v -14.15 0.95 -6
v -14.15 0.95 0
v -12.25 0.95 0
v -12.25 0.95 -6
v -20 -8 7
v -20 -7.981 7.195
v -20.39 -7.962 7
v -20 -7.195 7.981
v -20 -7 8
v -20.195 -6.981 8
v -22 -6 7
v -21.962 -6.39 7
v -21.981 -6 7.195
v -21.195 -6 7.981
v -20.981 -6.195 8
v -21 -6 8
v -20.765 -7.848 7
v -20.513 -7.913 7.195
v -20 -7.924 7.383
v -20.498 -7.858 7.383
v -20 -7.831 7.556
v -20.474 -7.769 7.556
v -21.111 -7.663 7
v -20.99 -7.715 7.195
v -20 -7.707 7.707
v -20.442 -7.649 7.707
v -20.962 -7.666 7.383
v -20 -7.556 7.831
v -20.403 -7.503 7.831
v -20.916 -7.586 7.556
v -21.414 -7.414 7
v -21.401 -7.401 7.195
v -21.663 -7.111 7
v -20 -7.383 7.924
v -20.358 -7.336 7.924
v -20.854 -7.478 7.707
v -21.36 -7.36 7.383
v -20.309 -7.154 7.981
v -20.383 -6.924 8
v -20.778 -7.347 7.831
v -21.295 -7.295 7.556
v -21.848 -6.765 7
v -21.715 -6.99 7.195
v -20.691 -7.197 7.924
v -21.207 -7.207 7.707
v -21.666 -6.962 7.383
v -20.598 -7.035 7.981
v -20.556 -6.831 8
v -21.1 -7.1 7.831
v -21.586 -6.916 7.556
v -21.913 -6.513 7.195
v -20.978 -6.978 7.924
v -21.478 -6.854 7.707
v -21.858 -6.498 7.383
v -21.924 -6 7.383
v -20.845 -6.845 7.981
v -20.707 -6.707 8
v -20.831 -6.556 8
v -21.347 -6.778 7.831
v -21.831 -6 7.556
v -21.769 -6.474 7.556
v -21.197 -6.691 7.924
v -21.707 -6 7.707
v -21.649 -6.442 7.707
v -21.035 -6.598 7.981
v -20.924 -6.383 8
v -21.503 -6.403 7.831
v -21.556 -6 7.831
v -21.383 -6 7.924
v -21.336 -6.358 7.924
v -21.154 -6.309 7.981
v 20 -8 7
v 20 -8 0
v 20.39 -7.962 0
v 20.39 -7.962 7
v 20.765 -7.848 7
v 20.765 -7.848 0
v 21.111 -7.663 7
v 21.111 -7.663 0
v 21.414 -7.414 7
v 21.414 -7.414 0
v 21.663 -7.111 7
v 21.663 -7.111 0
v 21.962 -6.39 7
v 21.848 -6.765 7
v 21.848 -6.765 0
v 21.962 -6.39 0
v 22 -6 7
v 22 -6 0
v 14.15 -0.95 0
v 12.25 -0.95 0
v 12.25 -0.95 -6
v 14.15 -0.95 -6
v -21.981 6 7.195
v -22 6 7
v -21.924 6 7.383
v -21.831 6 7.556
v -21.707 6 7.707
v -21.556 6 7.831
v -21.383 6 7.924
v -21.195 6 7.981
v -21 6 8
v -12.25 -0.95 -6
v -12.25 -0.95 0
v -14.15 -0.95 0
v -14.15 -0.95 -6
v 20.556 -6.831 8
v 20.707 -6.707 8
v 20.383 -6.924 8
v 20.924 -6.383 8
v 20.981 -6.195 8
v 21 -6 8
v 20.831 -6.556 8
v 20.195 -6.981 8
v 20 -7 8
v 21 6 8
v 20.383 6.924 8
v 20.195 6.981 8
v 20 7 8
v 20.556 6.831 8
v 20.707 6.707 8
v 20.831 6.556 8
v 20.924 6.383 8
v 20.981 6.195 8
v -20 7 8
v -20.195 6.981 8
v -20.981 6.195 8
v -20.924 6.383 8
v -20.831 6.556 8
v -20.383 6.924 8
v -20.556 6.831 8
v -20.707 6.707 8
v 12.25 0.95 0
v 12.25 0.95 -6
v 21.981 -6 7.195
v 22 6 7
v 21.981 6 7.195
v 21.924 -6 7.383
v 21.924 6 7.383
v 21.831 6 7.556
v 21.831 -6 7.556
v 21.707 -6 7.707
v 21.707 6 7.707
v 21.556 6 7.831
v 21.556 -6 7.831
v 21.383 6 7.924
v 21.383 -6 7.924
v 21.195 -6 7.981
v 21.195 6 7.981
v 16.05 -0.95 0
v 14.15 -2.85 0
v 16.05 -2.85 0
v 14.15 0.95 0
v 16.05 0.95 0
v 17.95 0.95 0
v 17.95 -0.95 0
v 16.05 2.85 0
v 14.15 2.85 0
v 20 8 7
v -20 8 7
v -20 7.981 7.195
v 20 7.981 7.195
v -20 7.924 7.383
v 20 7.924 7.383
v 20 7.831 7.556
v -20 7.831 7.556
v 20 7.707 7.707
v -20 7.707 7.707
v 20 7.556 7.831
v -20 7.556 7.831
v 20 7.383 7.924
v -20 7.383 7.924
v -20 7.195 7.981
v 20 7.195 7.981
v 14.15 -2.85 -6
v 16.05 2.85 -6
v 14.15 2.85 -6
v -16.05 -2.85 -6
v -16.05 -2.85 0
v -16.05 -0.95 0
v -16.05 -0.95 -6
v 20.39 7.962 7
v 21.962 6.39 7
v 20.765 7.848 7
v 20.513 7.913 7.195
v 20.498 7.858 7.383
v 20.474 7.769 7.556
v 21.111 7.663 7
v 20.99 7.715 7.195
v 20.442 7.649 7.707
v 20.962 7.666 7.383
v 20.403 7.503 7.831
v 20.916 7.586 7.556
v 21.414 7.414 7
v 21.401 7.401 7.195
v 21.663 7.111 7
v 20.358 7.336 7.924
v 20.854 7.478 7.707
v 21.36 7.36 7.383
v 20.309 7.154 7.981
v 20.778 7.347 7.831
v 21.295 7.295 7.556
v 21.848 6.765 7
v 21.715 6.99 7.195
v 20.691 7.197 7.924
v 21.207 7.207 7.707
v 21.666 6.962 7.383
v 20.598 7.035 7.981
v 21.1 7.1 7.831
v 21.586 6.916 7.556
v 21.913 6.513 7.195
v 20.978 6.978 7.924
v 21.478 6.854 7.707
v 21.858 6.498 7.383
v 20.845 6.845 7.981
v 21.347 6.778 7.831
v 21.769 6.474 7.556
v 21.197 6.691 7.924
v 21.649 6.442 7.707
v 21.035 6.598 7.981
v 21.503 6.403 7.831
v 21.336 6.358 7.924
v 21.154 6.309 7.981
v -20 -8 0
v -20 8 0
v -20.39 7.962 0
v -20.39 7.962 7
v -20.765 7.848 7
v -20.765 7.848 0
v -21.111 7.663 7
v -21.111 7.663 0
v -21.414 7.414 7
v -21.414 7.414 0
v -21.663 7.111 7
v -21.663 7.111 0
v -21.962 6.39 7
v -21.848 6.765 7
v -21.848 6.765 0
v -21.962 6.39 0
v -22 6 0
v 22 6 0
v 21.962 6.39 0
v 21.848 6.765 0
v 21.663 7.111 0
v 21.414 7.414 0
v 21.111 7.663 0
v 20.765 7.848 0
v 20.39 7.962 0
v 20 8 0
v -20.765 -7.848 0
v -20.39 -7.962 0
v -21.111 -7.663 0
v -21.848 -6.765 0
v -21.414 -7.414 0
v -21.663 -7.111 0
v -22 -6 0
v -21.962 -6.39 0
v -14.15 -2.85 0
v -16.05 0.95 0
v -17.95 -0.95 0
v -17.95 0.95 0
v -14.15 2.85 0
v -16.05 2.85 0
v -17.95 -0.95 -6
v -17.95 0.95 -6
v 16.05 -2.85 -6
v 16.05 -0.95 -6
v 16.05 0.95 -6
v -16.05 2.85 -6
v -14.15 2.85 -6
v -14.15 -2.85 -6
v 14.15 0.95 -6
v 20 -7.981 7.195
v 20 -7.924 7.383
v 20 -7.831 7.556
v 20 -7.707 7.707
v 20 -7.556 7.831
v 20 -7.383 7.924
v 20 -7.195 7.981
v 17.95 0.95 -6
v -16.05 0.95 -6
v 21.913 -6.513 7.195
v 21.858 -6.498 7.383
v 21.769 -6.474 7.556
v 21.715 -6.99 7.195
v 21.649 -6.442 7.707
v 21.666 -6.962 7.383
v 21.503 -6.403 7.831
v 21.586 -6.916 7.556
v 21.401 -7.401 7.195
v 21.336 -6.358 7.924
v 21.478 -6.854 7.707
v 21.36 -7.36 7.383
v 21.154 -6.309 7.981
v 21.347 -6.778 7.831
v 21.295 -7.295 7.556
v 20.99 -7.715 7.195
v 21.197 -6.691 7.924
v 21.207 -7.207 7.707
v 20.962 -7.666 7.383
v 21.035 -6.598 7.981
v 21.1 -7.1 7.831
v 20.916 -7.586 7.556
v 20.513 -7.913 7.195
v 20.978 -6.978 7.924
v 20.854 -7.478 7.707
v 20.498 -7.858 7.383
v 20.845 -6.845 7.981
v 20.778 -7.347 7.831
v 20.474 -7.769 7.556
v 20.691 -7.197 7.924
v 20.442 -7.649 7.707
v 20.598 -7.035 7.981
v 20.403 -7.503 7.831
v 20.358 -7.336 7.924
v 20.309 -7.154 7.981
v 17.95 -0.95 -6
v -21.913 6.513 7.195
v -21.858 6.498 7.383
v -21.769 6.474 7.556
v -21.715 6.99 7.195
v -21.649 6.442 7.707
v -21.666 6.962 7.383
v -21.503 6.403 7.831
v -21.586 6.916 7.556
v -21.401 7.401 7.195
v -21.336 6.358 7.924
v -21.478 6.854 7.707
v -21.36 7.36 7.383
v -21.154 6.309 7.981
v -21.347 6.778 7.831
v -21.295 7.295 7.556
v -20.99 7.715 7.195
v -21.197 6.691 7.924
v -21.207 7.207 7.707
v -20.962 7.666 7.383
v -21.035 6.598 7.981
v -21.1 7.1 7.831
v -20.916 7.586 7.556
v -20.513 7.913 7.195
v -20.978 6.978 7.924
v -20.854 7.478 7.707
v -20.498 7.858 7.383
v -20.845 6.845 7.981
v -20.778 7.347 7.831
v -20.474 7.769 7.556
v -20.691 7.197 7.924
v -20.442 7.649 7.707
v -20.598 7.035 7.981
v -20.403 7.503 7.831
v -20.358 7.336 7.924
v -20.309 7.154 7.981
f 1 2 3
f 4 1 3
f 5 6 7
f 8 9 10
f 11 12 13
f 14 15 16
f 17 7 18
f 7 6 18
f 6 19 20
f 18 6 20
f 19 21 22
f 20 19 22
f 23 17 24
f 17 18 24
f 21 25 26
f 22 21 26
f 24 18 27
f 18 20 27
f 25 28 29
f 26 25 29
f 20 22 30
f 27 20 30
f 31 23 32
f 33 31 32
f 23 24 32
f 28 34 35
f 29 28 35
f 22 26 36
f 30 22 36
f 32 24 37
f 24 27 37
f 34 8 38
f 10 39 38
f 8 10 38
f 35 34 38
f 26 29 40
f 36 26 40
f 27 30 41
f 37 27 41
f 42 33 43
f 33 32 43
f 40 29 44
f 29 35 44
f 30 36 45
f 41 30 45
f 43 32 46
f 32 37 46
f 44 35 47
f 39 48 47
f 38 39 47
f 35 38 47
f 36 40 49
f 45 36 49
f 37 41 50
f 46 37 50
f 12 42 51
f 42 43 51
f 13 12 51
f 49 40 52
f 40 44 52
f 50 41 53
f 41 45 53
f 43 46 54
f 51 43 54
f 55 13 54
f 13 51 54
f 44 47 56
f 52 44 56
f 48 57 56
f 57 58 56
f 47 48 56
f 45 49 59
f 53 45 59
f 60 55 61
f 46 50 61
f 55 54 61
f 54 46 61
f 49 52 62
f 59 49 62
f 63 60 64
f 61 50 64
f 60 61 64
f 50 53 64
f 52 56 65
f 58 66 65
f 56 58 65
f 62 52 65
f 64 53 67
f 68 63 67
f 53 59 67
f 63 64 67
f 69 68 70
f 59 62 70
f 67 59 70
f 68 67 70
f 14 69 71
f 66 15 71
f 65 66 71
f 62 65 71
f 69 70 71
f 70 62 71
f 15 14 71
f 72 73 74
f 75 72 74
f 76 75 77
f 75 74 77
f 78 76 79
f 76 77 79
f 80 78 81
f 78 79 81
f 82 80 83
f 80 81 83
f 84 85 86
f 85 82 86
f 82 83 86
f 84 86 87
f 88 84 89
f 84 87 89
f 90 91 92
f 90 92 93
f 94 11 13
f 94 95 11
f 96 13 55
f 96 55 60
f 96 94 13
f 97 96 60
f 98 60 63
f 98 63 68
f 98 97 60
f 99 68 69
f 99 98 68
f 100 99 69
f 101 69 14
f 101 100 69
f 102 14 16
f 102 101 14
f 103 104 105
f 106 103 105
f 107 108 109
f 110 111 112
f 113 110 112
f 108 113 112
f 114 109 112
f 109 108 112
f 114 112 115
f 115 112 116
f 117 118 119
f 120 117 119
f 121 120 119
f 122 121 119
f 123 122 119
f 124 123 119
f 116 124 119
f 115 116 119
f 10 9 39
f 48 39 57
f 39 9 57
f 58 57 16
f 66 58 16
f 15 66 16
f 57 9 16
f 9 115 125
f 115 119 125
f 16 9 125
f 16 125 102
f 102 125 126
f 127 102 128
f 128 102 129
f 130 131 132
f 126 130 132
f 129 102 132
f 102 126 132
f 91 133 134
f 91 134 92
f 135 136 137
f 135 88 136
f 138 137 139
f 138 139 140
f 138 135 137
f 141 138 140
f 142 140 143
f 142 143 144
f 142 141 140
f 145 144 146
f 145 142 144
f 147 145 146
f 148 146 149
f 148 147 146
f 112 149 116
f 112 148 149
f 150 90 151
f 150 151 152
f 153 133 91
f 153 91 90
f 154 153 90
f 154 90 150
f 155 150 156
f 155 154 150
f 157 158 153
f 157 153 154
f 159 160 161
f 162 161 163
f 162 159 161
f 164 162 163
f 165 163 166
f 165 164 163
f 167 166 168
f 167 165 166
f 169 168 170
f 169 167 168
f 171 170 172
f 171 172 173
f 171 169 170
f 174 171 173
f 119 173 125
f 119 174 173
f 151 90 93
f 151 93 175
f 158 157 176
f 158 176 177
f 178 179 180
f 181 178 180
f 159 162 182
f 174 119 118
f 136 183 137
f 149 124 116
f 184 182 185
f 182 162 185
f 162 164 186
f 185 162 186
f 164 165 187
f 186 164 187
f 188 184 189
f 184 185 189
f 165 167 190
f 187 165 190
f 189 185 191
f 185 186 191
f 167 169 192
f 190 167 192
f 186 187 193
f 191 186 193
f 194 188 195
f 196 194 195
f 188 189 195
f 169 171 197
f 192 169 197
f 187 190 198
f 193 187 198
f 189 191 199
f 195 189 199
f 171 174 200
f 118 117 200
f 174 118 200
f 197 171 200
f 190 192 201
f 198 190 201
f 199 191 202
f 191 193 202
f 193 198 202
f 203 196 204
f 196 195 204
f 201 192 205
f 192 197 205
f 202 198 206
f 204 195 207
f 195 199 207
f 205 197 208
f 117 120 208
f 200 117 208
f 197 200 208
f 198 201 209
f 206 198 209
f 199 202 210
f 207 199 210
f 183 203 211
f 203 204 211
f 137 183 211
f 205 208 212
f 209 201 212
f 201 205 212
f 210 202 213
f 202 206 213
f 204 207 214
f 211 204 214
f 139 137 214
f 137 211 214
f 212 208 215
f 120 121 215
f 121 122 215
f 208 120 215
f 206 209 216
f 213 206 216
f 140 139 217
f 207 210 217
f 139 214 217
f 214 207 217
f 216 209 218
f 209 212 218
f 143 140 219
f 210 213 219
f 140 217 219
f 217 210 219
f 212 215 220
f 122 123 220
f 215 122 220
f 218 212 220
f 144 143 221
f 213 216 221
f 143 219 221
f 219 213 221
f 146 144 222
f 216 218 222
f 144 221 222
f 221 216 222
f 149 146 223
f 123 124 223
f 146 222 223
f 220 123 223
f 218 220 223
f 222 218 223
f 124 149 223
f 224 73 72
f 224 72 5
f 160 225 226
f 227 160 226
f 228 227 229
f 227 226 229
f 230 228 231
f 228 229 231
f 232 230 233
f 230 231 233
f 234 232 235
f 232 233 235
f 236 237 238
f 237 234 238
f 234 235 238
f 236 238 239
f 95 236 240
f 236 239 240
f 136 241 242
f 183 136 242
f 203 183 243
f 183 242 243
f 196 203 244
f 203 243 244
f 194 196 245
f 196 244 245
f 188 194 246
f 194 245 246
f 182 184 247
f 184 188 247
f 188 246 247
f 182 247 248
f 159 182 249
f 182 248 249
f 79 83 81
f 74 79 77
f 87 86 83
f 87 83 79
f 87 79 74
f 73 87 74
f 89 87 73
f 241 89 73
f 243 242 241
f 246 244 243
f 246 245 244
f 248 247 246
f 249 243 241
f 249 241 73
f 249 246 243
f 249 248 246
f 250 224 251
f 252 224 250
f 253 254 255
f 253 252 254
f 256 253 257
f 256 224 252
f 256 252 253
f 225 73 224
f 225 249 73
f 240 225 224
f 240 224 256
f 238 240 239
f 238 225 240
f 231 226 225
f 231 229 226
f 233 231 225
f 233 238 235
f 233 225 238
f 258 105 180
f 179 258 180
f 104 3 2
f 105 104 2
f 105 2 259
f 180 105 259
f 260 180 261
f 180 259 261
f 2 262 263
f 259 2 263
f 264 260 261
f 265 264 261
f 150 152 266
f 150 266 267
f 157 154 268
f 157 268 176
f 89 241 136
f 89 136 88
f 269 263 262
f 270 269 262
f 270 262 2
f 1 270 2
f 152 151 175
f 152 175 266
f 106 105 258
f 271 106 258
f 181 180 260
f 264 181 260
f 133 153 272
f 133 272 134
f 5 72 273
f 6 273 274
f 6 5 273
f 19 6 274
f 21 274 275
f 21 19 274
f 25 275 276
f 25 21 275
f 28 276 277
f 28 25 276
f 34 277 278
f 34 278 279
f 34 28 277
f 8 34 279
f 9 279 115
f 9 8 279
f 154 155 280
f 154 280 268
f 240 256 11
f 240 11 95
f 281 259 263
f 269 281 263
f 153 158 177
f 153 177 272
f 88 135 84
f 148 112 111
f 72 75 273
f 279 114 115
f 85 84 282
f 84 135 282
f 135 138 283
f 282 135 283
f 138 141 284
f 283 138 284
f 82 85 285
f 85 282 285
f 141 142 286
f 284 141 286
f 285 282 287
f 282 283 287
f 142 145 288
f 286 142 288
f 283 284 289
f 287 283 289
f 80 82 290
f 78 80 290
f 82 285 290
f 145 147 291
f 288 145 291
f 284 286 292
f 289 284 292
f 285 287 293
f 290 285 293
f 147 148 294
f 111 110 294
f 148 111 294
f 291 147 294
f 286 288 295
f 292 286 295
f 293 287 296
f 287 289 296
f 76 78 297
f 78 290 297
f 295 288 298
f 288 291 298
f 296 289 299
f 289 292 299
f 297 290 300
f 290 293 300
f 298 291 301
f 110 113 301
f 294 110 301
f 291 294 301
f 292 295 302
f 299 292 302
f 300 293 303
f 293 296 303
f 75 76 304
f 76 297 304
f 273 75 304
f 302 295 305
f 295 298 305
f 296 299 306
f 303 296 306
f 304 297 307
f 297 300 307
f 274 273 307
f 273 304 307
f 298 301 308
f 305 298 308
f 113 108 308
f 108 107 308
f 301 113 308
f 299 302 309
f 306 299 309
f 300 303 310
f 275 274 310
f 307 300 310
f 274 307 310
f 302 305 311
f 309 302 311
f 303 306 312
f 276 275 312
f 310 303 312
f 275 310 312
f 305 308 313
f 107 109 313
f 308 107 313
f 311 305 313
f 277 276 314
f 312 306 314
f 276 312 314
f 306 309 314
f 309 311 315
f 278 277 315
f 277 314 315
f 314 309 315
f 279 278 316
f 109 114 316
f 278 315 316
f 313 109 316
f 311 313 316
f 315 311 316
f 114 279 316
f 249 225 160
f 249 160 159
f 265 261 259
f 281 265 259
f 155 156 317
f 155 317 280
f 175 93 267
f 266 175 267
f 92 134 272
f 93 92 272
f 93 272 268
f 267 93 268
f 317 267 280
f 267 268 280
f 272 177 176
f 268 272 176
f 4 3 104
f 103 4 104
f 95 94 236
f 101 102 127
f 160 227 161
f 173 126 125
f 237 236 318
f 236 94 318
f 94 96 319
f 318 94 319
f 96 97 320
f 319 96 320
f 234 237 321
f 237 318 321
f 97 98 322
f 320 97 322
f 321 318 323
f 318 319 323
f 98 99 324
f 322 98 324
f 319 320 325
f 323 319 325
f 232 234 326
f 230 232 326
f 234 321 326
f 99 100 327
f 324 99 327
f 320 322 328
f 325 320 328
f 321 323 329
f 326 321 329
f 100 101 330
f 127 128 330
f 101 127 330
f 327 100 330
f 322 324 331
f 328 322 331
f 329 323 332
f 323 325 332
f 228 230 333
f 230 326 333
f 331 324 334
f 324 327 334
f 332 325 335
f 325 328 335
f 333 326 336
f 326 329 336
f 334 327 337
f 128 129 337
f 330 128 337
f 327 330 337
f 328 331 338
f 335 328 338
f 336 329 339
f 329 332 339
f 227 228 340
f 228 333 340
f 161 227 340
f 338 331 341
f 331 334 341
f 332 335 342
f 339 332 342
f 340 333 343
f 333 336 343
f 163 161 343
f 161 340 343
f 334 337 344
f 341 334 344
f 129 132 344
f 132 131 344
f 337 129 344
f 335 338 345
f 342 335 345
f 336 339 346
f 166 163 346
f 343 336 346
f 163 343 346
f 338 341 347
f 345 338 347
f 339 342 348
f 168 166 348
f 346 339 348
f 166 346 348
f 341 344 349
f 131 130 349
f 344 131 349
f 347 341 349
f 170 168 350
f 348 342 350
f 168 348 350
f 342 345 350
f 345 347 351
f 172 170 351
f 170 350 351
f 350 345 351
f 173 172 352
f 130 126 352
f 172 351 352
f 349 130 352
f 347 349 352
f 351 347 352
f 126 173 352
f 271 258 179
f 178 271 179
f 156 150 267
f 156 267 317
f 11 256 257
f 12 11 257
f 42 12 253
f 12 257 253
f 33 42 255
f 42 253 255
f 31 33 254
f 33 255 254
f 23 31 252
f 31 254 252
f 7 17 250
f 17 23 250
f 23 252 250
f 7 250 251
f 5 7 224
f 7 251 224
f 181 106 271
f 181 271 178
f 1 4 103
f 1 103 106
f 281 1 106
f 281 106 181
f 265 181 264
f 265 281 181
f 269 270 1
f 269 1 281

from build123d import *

# Parameters (mm, degrees)
EXTRUDE_DEPTH    = 8
FILLET_R         = 1
EXTRUDE001_DEPTH = 6
EXTRUDE002_DEPTH = 6


with BuildPart() as fillet_body:
    # Sketch → Extrude (new body)
    with BuildSketch(Plane.XY):
        with BuildLine():
            Line((-20, 8), (20, 8))
            ThreePointArc((22, 6), (21.414214, 7.414214), (20, 8))
            Line((22, 6), (22, -6))
            ThreePointArc((20, -8), (21.414214, -7.414214), (22, -6))
            Line((20, -8), (-20, -8))
            ThreePointArc((-22, -6), (-21.414214, -7.414214), (-20, -8))
            Line((-22, -6), (-22, 6))
            ThreePointArc((-20, 8), (-21.414214, 7.414214), (-22, 6))
        make_face()
    extrude(amount=EXTRUDE_DEPTH)

    # Fillet
    fillet_edges = [fillet_body.edges().sort_by_distance(p)[0] for p in [
        (-22, 0, 8),
        (-21.414214, 7.414214, 8),
        (0, 8, 8),
        (21.414214, 7.414214, 8),
        (22, 0, 8),
        (21.414214, -7.414214, 8),
        (0, -8, 8),
        (-21.414214, -7.414214, 8),
    ]]
    fillet(fillet_edges, radius=FILLET_R)


with BuildPart() as extrude001:
    # Sketch001 → Extrude001 (new body)
    with BuildSketch(Plane.XY):
        Polygon((-17.95, 0.949994), (-16.05, 0.949994), (-16.05, 2.849994), (-14.15, 2.849994), (-14.15, 0.949994), (-12.25, 0.950006), (-12.25, -0.949994), (-14.15, -0.949994), (-14.15, -2.849994), (-16.05, -2.850006), (-16.05, -0.950006), (-17.95, -0.950006), align=None)
    extrude(amount=-EXTRUDE001_DEPTH)


with BuildPart() as extrude002:
    # MirroredSketch → Extrude002 (new body)
    with BuildSketch(Plane.XY):
        Polygon((17.95, 0.949994), (16.05, 0.949994), (16.05, 2.849994), (14.15, 2.849994), (14.15, 0.949994), (12.25, 0.950006), (12.25, -0.949994), (14.15, -0.949994), (14.15, -2.849994), (16.05, -2.850006), (16.05, -0.950006), (17.95, -0.950006), align=None)
    extrude(amount=-EXTRUDE002_DEPTH)


solid = Compound([fillet_body.part, extrude001.part, extrude002.part])
